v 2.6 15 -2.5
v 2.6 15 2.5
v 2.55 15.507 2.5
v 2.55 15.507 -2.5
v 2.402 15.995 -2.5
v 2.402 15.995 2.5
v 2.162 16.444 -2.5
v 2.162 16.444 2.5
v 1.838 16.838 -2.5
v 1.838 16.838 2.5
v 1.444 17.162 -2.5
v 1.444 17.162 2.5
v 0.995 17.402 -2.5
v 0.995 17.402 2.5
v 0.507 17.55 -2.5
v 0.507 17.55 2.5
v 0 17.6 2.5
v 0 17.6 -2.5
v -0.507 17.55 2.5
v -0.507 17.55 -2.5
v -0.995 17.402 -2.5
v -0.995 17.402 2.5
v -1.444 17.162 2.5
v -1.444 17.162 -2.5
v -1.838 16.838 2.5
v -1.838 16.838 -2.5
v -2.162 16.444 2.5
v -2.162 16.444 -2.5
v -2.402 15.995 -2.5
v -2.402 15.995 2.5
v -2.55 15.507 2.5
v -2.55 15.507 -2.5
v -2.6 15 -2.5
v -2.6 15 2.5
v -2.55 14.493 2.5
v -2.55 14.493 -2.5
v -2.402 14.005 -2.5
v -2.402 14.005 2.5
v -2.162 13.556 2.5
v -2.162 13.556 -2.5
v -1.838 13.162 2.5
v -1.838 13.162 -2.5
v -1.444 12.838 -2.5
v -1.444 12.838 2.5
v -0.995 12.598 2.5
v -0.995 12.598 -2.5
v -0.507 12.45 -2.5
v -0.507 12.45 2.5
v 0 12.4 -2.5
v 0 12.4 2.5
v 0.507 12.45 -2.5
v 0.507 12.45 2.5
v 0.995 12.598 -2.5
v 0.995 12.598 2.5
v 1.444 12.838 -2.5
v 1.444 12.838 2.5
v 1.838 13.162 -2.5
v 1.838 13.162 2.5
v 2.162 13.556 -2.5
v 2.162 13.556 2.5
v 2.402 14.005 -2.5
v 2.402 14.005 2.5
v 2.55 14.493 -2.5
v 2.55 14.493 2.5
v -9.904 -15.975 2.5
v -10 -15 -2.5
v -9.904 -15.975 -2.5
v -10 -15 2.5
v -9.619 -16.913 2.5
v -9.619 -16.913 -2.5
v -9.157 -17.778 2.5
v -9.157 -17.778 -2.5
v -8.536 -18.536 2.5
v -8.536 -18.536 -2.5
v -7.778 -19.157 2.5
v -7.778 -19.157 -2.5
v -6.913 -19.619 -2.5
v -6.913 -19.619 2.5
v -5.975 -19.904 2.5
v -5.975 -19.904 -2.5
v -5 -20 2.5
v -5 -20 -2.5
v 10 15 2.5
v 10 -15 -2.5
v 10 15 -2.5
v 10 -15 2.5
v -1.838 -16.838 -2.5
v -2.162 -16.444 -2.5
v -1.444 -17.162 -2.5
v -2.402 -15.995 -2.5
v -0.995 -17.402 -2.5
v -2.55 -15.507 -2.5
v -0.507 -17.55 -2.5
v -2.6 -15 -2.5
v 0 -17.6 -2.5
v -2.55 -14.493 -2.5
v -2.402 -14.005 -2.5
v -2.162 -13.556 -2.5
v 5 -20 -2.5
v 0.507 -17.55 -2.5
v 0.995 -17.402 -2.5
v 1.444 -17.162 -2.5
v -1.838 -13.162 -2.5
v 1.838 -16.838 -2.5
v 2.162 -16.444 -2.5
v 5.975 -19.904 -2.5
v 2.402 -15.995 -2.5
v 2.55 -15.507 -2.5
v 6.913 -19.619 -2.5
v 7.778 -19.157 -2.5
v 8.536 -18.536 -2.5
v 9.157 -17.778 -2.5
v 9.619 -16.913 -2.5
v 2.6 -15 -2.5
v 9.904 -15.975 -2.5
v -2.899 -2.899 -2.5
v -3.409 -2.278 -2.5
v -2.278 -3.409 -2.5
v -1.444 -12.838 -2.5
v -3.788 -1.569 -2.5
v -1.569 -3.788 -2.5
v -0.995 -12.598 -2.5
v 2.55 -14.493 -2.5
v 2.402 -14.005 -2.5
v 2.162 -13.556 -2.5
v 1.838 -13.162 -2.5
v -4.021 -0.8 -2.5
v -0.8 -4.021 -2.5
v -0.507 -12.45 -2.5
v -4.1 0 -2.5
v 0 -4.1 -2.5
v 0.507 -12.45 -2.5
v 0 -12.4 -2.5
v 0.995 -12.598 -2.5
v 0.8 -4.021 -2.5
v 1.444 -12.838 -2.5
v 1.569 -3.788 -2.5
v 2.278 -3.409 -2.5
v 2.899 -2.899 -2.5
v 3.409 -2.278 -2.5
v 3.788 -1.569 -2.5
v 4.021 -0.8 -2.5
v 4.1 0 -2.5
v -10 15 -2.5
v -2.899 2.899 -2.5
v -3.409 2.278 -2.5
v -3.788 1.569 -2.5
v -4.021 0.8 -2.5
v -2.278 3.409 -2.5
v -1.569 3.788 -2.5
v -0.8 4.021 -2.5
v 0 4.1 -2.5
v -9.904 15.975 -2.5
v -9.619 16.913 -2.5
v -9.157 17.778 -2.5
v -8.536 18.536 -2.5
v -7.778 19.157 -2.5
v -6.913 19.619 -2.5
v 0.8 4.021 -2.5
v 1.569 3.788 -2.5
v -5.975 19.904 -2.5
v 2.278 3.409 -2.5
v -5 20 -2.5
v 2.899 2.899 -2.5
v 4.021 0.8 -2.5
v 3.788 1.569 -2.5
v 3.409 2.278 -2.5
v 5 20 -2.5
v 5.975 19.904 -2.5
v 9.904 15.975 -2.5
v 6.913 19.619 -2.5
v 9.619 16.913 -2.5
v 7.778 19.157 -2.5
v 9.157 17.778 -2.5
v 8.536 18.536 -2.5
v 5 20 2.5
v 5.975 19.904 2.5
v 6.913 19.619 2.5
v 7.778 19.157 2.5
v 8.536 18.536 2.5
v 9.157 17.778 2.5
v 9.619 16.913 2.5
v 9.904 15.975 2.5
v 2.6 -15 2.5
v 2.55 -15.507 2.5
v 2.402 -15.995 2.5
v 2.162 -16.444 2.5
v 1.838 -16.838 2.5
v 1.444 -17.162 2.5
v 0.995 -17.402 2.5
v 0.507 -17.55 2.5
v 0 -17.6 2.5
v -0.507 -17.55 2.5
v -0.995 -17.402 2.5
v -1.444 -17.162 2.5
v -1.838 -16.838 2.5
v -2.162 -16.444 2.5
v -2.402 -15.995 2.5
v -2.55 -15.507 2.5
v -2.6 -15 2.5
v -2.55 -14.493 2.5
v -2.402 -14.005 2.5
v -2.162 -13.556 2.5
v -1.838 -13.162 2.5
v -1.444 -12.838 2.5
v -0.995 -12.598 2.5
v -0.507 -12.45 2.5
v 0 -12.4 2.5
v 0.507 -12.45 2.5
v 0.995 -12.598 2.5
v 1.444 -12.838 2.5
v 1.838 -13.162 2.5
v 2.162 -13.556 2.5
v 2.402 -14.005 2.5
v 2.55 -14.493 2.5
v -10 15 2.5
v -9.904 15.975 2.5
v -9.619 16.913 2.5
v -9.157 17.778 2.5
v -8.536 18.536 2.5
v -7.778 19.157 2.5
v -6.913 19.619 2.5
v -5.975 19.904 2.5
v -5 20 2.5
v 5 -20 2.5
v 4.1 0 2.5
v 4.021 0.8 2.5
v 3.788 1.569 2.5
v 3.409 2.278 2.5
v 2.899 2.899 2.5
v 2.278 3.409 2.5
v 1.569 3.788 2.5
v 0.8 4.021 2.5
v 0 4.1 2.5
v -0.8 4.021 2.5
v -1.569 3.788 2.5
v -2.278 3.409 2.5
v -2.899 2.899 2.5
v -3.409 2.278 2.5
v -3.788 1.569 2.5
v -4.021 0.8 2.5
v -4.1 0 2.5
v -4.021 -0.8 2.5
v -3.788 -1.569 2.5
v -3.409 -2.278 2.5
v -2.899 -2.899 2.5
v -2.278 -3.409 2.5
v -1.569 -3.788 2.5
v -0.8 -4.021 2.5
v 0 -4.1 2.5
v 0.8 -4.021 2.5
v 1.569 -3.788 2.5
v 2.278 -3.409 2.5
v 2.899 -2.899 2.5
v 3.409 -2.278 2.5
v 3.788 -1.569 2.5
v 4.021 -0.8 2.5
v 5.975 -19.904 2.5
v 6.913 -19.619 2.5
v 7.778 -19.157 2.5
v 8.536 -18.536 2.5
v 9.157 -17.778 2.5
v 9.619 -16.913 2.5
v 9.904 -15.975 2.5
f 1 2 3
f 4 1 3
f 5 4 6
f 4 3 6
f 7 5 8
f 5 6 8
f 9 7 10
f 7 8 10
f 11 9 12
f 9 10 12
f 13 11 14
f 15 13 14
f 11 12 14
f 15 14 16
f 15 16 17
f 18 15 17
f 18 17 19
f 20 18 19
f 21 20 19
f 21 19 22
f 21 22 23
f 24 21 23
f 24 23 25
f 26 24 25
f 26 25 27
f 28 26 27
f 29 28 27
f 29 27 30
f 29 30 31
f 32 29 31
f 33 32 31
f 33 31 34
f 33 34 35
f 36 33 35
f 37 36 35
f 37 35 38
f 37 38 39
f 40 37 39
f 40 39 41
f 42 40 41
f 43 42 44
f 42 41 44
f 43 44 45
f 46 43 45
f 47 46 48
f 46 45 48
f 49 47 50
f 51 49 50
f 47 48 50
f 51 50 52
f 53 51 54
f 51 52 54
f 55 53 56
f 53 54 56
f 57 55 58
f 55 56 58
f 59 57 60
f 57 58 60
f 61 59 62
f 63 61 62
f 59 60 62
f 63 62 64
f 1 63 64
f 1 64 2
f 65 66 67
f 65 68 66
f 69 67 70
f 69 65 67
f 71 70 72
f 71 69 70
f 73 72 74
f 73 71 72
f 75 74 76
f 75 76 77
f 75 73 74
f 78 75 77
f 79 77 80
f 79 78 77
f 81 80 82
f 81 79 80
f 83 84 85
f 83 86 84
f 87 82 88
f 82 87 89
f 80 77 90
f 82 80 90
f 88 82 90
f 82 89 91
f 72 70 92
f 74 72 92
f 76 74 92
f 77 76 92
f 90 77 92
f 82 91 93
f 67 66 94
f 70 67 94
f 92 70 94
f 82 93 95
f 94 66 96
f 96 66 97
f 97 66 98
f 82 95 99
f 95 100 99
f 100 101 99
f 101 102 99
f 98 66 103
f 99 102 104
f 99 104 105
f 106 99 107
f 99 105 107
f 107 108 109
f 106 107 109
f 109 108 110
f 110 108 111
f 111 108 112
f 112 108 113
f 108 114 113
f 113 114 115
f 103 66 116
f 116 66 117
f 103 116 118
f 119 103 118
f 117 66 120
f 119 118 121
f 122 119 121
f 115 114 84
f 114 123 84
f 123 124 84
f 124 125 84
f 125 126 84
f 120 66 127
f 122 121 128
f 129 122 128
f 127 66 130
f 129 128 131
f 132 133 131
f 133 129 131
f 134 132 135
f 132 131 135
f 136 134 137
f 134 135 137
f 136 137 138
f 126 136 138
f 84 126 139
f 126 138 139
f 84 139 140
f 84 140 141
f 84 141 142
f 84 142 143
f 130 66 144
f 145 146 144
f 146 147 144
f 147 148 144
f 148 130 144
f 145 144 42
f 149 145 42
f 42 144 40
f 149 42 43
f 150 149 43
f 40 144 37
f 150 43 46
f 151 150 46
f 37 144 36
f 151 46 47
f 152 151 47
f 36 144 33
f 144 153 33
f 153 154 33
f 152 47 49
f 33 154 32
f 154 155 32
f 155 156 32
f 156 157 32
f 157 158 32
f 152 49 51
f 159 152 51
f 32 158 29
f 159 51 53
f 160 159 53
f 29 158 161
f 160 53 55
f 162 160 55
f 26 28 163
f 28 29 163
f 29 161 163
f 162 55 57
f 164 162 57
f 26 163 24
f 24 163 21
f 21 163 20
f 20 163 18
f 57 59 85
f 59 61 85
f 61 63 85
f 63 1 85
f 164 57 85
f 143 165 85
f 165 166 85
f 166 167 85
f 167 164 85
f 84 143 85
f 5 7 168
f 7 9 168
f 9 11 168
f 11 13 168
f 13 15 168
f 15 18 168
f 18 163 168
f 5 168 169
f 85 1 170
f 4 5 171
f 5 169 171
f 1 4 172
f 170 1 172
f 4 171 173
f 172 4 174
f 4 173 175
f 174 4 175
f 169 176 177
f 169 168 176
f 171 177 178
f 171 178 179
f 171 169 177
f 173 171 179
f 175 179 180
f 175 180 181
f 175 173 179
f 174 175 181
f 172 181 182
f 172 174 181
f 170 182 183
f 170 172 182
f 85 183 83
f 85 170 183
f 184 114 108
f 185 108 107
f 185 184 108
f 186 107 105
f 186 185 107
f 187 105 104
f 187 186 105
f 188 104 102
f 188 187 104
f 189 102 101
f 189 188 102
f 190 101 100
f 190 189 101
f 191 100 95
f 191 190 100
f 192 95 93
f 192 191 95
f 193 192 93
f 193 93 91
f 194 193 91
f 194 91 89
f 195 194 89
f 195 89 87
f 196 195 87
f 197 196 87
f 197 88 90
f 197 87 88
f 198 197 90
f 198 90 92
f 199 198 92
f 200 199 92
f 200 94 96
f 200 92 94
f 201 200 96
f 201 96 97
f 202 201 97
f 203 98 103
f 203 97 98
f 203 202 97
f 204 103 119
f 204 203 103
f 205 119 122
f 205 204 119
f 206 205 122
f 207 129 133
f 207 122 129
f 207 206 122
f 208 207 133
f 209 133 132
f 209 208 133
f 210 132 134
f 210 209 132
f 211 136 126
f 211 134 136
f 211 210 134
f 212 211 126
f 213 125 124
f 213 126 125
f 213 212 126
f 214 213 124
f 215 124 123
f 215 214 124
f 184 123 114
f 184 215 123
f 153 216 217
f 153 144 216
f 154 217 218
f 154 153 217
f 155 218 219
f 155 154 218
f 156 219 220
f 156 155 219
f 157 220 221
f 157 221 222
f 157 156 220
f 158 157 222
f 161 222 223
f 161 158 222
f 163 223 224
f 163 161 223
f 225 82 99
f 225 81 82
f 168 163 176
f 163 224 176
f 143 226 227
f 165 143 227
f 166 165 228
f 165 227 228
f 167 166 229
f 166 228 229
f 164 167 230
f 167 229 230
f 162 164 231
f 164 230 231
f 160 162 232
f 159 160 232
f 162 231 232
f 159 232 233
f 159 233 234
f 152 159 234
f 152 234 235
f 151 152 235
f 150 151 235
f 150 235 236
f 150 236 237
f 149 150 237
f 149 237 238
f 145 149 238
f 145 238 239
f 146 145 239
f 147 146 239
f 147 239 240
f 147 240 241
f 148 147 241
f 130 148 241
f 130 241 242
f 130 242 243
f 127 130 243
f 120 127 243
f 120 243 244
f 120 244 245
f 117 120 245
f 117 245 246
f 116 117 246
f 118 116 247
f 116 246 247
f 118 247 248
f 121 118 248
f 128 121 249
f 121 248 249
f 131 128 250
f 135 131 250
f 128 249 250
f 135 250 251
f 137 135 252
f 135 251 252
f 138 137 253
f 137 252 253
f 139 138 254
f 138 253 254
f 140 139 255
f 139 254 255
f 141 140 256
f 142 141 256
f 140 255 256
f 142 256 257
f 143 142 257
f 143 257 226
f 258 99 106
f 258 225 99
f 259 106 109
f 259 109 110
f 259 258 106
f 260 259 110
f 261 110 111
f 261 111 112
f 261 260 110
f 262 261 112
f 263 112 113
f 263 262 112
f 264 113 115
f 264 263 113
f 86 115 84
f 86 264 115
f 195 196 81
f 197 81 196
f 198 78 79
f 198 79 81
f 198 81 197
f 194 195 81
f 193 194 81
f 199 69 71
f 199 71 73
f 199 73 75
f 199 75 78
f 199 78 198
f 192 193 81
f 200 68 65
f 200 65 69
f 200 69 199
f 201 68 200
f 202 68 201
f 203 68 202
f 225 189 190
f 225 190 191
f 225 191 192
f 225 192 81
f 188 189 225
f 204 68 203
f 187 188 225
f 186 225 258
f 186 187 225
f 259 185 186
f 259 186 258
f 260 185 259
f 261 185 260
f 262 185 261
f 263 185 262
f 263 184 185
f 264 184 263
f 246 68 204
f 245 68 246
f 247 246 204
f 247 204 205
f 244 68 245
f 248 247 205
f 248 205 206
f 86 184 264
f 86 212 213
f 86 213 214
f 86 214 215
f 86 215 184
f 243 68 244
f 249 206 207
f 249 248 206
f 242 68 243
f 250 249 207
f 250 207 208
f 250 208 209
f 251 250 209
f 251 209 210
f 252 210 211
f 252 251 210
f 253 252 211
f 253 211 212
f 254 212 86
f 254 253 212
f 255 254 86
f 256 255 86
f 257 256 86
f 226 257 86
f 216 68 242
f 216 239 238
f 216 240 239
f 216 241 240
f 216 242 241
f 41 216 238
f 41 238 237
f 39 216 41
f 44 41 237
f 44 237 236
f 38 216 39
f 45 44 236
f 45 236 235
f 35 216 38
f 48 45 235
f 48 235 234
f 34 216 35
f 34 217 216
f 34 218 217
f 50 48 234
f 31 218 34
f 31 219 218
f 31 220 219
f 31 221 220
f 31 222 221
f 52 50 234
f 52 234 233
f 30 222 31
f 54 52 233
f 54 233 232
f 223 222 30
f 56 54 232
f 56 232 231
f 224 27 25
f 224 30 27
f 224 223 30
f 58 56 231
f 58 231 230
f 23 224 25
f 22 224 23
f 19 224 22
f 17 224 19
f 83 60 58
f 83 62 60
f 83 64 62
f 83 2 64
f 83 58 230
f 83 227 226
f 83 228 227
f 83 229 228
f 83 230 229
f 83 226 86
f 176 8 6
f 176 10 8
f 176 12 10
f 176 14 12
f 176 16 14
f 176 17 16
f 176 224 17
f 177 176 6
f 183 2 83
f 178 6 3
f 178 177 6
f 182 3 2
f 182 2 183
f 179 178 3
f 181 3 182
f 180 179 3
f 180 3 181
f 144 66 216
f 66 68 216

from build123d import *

# Parameters (mm, degrees)
ESBO_O1_W                = 20
ESBO_O1_H                = 40
RESSALTO_EXTRUS_O1_DEPTH = 2.5
ESBO_O2_R                = 4.1
CORTE_EXTRUS_O1_DEPTH    = 23.912878475
ESBO_O3_R                = 2.6
CORTE_EXTRUS_O2_DEPTH    = 23.912878475
FILETE1_R                = 5


with BuildPart() as part:
    # Esboço1 → Ressalto-extrusão1 (new, symmetric)
    with BuildSketch(Plane.XY):
        Rectangle(ESBO_O1_W, ESBO_O1_H)
    extrude(amount=RESSALTO_EXTRUS_O1_DEPTH, both=True)

    # Esboço2 → Corte-extrusão1 (cut, through all)
    with BuildSketch(Plane.XY.offset(2.5)):
        Circle(ESBO_O2_R)
    extrude(amount=-CORTE_EXTRUS_O1_DEPTH, mode=Mode.SUBTRACT)

    # Esboço3 → Corte-extrusão2 (cut, through all)
    with BuildSketch(Plane.XY.offset(2.5)):
        with Locations((0, 15)):
            Circle(ESBO_O3_R)
    corte_extrus_o2 = extrude(amount=-CORTE_EXTRUS_O2_DEPTH, mode=Mode.SUBTRACT)

    # Espelhar1: Corte-extrusão2 across plane
    add(corte_extrus_o2.mirror(Plane.ZX), mode=Mode.SUBTRACT)

    # Filete1
    filete1_edges = [part.edges().sort_by_distance(p)[0] for p in [
        (10, -20, 0),
        (-10, -20, 0),
        (-10, 20, 0),
        (10, 20, 0),
    ]]
    fillet(filete1_edges, radius=FILETE1_R)


solid = part.part
